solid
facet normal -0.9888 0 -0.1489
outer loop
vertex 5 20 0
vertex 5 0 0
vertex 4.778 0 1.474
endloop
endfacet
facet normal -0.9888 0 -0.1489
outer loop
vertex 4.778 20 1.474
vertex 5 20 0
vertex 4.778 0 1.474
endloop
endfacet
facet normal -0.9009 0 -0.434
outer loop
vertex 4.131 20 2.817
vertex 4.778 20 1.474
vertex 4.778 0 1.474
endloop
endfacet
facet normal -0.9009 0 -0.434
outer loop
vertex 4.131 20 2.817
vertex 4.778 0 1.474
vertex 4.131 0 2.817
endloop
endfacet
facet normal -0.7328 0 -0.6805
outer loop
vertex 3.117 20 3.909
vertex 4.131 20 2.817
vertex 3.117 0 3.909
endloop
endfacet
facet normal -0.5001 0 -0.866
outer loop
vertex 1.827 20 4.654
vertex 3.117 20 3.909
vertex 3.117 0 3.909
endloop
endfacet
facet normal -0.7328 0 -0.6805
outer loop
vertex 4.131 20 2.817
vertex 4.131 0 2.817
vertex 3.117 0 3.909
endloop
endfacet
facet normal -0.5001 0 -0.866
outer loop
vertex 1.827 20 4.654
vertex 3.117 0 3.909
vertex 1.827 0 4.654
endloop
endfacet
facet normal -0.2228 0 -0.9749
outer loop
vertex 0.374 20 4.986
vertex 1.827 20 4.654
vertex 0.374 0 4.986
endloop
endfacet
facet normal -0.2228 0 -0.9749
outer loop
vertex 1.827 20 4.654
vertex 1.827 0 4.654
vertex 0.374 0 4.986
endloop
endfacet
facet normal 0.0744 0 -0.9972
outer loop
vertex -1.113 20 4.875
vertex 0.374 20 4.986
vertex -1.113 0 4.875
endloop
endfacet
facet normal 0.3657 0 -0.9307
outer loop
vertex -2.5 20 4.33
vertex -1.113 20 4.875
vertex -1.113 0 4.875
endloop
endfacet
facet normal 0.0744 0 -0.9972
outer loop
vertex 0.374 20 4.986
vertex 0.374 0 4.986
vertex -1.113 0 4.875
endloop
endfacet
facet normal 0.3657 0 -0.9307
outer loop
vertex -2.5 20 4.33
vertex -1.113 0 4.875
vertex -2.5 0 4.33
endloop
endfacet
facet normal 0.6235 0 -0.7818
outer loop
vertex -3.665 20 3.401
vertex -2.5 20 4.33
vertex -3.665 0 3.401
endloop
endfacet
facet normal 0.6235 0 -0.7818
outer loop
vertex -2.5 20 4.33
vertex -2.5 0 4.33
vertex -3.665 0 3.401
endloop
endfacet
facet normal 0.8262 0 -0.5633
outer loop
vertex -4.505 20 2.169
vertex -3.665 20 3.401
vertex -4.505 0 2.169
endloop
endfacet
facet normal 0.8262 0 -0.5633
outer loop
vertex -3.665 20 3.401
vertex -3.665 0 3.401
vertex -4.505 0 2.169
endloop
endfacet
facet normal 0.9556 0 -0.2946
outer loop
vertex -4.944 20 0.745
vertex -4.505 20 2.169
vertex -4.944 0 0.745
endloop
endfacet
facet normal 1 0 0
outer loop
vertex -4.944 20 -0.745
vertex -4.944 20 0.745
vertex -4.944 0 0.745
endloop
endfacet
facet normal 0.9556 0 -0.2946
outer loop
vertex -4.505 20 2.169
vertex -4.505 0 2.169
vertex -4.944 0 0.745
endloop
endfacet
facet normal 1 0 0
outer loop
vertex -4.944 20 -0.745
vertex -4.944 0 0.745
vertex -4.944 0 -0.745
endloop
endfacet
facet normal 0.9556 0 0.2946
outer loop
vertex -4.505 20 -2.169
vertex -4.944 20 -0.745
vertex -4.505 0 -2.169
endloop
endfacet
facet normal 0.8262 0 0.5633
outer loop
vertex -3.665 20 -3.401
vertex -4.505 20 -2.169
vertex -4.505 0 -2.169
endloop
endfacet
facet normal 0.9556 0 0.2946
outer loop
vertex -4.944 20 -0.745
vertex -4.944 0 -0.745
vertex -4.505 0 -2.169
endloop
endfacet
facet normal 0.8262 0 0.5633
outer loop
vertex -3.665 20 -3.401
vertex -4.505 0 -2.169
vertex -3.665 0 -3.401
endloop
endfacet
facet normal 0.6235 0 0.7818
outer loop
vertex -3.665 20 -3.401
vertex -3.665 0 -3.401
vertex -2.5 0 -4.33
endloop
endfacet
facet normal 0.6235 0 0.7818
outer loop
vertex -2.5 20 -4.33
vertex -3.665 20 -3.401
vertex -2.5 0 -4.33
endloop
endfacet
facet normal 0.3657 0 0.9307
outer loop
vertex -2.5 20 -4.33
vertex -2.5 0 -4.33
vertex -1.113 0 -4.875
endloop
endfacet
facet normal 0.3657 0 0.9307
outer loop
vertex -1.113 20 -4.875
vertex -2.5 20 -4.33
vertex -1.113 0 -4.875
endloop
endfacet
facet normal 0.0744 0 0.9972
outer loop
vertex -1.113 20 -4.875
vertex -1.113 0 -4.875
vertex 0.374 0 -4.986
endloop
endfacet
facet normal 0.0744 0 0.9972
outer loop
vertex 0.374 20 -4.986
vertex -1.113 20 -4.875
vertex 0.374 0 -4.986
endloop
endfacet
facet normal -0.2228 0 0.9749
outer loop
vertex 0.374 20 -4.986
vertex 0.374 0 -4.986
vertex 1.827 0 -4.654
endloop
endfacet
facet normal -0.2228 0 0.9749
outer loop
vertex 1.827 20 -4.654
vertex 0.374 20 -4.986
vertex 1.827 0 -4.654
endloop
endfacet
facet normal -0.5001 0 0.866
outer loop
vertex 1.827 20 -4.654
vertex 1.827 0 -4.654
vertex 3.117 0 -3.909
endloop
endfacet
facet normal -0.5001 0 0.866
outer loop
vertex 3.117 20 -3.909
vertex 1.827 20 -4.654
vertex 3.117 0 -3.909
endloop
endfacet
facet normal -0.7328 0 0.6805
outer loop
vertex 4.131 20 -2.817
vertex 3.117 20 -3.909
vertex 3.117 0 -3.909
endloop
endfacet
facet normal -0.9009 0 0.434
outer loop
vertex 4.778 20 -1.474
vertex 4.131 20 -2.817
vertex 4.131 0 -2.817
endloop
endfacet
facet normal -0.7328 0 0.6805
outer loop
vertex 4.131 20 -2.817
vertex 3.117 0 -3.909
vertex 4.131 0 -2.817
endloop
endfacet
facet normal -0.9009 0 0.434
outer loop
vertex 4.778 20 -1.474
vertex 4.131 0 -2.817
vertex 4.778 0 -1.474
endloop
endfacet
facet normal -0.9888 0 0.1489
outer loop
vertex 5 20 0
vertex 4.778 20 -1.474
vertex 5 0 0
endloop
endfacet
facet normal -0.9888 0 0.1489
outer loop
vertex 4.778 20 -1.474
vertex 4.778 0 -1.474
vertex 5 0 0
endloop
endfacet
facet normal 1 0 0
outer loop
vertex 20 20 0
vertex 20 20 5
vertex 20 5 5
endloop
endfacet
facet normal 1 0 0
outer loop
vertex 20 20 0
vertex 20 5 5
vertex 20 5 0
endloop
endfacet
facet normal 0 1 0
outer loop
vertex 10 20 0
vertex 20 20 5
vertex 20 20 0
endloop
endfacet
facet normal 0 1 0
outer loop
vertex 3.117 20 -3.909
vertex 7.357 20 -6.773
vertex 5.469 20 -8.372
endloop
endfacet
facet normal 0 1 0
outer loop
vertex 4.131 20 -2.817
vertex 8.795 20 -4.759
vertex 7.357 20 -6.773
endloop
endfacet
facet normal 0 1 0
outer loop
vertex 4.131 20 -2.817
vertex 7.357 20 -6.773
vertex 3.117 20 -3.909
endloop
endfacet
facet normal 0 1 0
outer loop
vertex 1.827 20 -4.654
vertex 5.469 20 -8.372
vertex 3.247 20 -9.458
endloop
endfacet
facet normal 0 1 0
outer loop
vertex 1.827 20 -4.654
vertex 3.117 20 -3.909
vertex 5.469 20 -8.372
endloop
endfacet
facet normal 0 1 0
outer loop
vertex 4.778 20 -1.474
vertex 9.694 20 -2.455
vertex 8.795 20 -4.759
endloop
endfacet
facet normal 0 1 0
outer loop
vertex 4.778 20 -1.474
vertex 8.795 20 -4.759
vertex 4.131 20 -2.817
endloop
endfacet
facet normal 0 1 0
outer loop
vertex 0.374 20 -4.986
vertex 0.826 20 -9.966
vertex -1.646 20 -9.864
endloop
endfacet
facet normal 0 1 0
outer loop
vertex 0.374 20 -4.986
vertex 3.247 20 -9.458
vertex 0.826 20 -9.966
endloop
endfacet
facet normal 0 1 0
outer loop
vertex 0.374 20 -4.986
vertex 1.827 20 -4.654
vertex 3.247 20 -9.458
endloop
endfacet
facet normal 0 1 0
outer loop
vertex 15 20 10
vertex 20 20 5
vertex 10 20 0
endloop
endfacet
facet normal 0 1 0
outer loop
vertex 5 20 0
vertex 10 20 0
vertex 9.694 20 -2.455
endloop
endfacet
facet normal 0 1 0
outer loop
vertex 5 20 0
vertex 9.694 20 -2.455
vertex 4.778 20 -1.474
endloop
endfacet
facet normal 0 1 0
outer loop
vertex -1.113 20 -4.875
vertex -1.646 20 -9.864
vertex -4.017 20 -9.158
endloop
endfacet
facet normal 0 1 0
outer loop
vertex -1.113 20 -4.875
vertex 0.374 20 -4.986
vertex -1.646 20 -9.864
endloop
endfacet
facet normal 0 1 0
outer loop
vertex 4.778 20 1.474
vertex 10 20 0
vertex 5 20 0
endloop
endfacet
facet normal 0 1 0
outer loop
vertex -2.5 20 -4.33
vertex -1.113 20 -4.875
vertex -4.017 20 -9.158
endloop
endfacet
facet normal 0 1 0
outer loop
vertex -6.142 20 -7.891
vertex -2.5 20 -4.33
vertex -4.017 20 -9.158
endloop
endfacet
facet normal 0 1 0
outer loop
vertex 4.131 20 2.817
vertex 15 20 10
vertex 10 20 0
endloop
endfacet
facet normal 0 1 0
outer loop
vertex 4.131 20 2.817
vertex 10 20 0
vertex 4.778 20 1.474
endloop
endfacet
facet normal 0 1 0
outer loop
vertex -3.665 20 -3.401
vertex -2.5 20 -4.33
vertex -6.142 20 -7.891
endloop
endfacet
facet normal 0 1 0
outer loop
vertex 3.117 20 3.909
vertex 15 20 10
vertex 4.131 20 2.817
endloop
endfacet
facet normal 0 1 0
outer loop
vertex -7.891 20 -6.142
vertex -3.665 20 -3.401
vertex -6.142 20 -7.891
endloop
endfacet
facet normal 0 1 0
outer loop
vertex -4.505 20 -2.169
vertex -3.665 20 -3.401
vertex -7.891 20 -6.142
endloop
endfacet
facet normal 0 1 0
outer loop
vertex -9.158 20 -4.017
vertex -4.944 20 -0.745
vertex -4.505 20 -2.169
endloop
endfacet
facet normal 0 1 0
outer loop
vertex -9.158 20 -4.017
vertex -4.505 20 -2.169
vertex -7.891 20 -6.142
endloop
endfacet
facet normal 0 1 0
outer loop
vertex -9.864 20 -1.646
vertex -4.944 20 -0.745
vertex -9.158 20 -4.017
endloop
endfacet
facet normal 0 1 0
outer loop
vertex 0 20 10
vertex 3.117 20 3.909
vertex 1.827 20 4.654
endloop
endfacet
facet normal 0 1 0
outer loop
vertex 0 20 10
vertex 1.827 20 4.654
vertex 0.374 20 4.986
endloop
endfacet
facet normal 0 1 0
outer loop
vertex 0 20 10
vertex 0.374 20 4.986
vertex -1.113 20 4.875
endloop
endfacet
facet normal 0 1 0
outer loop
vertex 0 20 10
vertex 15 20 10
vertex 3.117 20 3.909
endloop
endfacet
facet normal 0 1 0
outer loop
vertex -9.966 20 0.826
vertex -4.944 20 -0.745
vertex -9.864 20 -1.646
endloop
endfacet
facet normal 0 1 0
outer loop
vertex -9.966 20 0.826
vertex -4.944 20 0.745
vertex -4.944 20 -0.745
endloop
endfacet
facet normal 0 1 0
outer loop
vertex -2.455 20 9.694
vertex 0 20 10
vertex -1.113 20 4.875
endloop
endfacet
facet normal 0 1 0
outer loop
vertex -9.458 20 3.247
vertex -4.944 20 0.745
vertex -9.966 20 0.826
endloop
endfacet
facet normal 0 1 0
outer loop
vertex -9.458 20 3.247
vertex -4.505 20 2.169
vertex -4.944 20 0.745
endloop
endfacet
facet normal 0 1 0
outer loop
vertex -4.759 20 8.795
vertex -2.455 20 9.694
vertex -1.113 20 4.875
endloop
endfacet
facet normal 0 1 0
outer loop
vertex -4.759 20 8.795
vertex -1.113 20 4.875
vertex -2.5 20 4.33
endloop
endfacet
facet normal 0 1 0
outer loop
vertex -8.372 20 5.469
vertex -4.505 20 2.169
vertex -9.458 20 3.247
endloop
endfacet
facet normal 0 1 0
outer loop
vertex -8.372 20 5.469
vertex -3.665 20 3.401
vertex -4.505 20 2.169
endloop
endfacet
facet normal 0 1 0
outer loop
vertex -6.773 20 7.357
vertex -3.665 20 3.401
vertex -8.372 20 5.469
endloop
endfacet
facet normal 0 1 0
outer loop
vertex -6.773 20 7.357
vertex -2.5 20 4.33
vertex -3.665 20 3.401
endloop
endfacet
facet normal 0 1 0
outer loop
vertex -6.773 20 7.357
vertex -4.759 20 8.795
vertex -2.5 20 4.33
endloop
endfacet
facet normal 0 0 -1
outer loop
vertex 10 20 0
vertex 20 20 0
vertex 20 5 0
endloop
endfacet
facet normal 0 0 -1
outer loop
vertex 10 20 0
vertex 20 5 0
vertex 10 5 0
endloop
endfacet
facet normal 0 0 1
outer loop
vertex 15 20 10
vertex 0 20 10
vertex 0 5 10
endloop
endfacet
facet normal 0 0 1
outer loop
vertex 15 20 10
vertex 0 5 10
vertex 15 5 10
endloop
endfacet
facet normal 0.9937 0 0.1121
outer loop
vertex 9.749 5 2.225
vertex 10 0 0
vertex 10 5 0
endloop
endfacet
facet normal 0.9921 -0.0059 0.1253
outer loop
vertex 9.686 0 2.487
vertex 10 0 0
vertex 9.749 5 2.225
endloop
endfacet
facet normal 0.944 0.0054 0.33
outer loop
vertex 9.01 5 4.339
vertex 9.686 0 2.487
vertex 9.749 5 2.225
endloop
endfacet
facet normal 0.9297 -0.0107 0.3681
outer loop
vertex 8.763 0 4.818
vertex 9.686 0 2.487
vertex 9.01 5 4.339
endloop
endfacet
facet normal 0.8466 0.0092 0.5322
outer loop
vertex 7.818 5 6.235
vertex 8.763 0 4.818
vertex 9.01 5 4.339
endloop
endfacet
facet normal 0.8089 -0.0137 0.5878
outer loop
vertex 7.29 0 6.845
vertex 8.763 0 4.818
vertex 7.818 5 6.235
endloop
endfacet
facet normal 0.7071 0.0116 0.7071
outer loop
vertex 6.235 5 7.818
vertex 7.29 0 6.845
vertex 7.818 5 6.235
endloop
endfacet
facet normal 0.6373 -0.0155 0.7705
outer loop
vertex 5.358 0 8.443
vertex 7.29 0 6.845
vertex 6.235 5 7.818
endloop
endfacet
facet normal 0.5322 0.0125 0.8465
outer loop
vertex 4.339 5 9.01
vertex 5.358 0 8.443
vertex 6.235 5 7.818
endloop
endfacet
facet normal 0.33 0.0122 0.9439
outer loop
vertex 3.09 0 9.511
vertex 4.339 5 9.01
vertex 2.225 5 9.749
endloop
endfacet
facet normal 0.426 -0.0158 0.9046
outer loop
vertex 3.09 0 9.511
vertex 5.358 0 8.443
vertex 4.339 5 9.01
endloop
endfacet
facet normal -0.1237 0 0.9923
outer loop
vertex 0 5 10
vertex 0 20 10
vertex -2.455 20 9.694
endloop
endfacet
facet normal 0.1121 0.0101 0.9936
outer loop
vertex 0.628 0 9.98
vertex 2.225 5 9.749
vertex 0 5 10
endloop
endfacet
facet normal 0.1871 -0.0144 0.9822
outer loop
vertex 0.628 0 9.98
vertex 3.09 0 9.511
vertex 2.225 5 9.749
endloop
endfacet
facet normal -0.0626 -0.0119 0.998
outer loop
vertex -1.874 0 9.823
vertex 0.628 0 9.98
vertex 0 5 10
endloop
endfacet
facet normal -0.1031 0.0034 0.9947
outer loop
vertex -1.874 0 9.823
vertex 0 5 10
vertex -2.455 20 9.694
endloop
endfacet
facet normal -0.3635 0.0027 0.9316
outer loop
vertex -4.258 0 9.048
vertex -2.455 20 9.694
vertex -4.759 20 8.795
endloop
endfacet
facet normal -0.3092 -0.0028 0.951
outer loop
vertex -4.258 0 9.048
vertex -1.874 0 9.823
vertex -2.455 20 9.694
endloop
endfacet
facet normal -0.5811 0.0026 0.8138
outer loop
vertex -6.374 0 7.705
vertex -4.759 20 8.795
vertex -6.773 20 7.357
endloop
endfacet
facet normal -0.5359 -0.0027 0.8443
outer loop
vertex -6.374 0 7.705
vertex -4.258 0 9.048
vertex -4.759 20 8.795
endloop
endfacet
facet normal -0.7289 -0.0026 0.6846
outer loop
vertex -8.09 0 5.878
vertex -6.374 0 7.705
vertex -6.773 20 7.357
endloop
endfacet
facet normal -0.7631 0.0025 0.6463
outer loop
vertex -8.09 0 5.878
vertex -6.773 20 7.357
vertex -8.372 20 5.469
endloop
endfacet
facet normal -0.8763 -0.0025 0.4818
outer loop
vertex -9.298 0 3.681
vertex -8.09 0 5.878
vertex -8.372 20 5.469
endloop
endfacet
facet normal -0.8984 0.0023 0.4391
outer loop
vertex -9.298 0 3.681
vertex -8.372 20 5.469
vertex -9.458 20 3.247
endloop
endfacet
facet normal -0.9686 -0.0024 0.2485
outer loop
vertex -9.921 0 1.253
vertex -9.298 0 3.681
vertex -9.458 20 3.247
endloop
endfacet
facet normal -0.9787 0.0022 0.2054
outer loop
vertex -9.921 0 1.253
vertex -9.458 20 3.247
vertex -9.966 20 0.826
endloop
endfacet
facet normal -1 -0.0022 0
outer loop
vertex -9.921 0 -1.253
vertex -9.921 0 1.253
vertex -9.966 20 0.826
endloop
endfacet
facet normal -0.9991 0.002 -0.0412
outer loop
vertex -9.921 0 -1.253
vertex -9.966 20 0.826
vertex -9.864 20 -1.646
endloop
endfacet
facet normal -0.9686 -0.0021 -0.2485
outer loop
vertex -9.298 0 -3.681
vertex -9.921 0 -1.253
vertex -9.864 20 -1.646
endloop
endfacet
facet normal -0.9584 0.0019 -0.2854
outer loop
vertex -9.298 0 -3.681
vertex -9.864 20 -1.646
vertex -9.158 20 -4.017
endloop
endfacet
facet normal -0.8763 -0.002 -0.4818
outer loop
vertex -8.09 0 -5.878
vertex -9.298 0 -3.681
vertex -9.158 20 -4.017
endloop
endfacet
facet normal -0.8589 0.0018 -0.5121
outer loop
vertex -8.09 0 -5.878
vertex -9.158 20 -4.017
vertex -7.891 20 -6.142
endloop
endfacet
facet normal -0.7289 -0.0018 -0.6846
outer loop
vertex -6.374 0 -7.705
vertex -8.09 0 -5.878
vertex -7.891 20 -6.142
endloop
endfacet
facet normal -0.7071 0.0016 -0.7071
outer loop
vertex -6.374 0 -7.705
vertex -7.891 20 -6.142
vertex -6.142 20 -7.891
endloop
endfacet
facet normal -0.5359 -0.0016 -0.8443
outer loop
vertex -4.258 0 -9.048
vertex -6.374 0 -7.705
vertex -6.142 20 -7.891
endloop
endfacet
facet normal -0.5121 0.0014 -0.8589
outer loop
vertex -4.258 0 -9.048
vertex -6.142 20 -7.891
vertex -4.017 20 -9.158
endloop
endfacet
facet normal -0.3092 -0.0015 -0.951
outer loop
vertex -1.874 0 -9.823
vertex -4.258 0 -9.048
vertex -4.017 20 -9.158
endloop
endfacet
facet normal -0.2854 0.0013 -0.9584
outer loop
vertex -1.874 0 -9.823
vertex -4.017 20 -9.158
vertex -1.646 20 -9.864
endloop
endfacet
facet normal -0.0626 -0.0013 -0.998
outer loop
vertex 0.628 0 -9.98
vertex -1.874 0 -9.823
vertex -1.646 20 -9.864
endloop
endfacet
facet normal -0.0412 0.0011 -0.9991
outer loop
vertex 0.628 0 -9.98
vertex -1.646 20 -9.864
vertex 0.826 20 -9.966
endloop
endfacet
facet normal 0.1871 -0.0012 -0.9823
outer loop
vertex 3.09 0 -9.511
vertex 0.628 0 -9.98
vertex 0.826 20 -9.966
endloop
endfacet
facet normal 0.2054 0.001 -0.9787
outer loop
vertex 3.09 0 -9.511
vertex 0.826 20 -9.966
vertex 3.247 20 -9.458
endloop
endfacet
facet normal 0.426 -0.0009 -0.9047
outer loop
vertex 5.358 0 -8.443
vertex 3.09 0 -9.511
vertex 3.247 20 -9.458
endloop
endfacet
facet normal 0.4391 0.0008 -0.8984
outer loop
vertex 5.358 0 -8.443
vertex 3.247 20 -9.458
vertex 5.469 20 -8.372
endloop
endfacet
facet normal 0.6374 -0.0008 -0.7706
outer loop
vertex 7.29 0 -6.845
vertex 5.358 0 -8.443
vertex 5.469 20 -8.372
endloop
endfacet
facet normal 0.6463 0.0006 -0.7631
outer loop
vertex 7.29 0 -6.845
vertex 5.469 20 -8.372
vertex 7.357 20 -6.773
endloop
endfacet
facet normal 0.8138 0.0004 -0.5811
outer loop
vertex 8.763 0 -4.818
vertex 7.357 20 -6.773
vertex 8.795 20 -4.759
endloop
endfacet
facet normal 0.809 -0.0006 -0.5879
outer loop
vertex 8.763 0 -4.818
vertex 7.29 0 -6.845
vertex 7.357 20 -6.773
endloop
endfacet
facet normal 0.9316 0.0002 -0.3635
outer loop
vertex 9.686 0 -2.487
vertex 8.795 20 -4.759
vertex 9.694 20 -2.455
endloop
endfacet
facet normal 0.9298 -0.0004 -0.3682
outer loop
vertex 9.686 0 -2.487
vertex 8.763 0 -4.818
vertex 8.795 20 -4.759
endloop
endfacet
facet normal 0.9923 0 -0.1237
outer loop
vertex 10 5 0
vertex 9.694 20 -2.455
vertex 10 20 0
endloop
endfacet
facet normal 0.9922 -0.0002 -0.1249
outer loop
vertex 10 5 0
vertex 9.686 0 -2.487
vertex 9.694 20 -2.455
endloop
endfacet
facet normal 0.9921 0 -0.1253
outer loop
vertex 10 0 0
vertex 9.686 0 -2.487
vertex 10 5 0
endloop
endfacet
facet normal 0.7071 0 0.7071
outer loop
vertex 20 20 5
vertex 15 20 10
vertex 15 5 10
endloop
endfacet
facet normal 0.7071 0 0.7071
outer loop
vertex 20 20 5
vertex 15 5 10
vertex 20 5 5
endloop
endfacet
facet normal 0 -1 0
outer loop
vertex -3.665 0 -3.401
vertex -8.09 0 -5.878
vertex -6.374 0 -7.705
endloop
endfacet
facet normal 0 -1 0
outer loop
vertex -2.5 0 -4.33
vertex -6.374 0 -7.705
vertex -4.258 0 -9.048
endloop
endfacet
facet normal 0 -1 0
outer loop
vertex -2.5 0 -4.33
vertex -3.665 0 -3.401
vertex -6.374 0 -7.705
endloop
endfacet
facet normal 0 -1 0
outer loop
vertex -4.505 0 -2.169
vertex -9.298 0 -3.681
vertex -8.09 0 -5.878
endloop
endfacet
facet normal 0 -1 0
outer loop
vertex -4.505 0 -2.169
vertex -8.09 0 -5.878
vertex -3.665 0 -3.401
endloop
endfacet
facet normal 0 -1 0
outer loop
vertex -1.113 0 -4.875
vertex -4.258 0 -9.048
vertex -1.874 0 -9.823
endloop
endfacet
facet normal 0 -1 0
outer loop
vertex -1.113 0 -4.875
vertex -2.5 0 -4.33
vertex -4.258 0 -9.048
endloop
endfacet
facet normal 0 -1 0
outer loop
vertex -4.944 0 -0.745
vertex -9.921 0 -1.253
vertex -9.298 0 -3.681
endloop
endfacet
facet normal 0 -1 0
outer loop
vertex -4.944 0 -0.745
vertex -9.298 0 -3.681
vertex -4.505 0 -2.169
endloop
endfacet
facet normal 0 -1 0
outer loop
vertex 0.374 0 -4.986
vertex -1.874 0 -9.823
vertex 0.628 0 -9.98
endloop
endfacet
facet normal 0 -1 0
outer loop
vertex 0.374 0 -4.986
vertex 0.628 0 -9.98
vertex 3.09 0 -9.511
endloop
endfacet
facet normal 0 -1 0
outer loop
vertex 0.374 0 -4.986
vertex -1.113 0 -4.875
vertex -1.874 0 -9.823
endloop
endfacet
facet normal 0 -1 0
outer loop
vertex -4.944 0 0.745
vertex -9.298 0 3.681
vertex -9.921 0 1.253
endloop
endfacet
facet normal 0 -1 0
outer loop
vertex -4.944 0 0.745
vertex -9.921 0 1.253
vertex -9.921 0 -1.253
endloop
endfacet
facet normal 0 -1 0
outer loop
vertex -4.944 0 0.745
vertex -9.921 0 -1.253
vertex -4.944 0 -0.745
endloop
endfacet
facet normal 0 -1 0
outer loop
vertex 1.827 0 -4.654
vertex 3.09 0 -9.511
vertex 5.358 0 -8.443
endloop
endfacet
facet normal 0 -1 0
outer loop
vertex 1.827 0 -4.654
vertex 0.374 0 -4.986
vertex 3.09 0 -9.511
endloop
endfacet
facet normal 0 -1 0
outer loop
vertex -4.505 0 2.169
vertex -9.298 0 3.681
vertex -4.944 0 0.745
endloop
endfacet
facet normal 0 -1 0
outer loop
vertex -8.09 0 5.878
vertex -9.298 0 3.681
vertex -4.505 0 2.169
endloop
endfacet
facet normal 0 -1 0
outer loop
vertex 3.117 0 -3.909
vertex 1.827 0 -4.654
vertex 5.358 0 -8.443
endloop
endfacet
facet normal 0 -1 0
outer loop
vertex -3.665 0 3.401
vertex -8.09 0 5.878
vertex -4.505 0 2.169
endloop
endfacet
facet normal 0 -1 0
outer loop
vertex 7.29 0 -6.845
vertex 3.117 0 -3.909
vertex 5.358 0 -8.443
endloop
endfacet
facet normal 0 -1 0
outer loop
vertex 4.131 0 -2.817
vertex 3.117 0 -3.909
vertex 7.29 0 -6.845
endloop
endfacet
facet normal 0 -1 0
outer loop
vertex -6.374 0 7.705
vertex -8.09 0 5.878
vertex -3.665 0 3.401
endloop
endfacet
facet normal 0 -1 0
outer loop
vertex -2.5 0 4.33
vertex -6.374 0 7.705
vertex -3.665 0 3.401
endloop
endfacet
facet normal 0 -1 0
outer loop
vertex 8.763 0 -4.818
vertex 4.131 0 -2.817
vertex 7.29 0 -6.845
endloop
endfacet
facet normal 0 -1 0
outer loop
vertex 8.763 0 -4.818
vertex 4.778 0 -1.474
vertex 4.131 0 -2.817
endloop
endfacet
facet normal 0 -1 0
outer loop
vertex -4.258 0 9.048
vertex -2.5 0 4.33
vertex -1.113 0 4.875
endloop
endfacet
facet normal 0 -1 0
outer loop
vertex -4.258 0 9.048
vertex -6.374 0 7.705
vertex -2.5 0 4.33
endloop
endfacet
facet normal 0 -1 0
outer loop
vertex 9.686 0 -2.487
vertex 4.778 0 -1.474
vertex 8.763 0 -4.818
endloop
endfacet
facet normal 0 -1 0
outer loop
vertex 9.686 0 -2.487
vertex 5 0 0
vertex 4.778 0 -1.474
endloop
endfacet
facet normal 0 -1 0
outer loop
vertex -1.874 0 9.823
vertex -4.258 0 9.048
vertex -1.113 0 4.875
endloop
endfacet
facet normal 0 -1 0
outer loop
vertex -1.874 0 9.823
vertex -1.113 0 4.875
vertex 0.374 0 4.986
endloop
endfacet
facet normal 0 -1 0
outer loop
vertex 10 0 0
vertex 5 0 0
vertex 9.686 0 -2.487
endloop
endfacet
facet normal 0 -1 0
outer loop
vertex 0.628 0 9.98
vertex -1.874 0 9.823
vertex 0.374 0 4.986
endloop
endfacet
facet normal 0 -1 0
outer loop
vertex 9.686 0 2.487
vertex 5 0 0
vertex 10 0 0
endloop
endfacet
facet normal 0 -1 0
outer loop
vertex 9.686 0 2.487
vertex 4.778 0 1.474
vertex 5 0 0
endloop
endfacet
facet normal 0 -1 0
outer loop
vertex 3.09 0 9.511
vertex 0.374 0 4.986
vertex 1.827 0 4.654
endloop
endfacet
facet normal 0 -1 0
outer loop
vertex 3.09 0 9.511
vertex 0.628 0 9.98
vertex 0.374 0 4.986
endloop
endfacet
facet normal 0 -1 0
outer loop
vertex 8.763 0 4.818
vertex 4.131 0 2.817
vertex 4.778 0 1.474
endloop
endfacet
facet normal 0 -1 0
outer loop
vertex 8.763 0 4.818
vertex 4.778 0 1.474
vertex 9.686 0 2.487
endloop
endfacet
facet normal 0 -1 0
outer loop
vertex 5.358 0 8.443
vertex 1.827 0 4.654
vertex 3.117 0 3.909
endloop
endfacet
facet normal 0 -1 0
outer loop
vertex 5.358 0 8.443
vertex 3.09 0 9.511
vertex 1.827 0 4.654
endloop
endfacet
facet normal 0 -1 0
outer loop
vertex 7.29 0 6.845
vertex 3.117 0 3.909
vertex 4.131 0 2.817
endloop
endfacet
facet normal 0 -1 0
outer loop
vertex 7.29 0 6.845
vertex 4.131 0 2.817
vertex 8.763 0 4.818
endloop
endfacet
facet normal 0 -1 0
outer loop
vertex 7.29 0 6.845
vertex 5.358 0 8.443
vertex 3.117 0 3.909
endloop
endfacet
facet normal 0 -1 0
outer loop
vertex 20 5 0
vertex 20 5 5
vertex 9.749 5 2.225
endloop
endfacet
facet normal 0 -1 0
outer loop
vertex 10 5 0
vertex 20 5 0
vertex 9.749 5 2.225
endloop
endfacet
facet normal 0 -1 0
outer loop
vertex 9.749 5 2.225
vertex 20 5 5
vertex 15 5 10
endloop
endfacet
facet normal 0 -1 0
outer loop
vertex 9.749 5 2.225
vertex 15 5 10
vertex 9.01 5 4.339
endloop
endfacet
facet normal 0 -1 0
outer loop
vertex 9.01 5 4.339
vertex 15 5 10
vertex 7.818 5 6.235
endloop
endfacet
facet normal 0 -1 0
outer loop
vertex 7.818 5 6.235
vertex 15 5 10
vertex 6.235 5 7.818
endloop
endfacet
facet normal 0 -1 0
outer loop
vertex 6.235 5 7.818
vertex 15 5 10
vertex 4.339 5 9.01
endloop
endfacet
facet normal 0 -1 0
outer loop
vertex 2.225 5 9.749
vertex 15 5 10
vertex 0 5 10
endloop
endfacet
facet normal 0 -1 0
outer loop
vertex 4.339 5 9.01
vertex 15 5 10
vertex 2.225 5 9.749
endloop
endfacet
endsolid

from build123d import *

# Parameters (mm, degrees)
F0_R     = 10
F0_R_2   = 5
F1_DEPTH = 20
F3_DEPTH = 15


with BuildPart() as f1:
    # F0 (on Front) → F1 (new body)
    with BuildSketch(Plane.XZ):
        Circle(F0_R)
        Circle(F0_R_2, mode=Mode.SUBTRACT)
    extrude(amount=-F1_DEPTH)

    # F2 (on face) → F3 (join)
    with BuildSketch(Plane(origin=(0, 20, 0), x_dir=(-1, 0, 0), z_dir=(0, 1, 0))):
        with BuildLine():
            Line((-15, 10), (-20, 5))
            Line((-20, 5), (-20, 0))
            Line((-20, 0), (-10, 0))
            ThreePointArc((-10, 0), (-7.071068, 7.071068), (0, 10))
            Line((0, 10), (-15, 10))
        make_face()
    extrude(amount=-F3_DEPTH)


solid = f1.part
